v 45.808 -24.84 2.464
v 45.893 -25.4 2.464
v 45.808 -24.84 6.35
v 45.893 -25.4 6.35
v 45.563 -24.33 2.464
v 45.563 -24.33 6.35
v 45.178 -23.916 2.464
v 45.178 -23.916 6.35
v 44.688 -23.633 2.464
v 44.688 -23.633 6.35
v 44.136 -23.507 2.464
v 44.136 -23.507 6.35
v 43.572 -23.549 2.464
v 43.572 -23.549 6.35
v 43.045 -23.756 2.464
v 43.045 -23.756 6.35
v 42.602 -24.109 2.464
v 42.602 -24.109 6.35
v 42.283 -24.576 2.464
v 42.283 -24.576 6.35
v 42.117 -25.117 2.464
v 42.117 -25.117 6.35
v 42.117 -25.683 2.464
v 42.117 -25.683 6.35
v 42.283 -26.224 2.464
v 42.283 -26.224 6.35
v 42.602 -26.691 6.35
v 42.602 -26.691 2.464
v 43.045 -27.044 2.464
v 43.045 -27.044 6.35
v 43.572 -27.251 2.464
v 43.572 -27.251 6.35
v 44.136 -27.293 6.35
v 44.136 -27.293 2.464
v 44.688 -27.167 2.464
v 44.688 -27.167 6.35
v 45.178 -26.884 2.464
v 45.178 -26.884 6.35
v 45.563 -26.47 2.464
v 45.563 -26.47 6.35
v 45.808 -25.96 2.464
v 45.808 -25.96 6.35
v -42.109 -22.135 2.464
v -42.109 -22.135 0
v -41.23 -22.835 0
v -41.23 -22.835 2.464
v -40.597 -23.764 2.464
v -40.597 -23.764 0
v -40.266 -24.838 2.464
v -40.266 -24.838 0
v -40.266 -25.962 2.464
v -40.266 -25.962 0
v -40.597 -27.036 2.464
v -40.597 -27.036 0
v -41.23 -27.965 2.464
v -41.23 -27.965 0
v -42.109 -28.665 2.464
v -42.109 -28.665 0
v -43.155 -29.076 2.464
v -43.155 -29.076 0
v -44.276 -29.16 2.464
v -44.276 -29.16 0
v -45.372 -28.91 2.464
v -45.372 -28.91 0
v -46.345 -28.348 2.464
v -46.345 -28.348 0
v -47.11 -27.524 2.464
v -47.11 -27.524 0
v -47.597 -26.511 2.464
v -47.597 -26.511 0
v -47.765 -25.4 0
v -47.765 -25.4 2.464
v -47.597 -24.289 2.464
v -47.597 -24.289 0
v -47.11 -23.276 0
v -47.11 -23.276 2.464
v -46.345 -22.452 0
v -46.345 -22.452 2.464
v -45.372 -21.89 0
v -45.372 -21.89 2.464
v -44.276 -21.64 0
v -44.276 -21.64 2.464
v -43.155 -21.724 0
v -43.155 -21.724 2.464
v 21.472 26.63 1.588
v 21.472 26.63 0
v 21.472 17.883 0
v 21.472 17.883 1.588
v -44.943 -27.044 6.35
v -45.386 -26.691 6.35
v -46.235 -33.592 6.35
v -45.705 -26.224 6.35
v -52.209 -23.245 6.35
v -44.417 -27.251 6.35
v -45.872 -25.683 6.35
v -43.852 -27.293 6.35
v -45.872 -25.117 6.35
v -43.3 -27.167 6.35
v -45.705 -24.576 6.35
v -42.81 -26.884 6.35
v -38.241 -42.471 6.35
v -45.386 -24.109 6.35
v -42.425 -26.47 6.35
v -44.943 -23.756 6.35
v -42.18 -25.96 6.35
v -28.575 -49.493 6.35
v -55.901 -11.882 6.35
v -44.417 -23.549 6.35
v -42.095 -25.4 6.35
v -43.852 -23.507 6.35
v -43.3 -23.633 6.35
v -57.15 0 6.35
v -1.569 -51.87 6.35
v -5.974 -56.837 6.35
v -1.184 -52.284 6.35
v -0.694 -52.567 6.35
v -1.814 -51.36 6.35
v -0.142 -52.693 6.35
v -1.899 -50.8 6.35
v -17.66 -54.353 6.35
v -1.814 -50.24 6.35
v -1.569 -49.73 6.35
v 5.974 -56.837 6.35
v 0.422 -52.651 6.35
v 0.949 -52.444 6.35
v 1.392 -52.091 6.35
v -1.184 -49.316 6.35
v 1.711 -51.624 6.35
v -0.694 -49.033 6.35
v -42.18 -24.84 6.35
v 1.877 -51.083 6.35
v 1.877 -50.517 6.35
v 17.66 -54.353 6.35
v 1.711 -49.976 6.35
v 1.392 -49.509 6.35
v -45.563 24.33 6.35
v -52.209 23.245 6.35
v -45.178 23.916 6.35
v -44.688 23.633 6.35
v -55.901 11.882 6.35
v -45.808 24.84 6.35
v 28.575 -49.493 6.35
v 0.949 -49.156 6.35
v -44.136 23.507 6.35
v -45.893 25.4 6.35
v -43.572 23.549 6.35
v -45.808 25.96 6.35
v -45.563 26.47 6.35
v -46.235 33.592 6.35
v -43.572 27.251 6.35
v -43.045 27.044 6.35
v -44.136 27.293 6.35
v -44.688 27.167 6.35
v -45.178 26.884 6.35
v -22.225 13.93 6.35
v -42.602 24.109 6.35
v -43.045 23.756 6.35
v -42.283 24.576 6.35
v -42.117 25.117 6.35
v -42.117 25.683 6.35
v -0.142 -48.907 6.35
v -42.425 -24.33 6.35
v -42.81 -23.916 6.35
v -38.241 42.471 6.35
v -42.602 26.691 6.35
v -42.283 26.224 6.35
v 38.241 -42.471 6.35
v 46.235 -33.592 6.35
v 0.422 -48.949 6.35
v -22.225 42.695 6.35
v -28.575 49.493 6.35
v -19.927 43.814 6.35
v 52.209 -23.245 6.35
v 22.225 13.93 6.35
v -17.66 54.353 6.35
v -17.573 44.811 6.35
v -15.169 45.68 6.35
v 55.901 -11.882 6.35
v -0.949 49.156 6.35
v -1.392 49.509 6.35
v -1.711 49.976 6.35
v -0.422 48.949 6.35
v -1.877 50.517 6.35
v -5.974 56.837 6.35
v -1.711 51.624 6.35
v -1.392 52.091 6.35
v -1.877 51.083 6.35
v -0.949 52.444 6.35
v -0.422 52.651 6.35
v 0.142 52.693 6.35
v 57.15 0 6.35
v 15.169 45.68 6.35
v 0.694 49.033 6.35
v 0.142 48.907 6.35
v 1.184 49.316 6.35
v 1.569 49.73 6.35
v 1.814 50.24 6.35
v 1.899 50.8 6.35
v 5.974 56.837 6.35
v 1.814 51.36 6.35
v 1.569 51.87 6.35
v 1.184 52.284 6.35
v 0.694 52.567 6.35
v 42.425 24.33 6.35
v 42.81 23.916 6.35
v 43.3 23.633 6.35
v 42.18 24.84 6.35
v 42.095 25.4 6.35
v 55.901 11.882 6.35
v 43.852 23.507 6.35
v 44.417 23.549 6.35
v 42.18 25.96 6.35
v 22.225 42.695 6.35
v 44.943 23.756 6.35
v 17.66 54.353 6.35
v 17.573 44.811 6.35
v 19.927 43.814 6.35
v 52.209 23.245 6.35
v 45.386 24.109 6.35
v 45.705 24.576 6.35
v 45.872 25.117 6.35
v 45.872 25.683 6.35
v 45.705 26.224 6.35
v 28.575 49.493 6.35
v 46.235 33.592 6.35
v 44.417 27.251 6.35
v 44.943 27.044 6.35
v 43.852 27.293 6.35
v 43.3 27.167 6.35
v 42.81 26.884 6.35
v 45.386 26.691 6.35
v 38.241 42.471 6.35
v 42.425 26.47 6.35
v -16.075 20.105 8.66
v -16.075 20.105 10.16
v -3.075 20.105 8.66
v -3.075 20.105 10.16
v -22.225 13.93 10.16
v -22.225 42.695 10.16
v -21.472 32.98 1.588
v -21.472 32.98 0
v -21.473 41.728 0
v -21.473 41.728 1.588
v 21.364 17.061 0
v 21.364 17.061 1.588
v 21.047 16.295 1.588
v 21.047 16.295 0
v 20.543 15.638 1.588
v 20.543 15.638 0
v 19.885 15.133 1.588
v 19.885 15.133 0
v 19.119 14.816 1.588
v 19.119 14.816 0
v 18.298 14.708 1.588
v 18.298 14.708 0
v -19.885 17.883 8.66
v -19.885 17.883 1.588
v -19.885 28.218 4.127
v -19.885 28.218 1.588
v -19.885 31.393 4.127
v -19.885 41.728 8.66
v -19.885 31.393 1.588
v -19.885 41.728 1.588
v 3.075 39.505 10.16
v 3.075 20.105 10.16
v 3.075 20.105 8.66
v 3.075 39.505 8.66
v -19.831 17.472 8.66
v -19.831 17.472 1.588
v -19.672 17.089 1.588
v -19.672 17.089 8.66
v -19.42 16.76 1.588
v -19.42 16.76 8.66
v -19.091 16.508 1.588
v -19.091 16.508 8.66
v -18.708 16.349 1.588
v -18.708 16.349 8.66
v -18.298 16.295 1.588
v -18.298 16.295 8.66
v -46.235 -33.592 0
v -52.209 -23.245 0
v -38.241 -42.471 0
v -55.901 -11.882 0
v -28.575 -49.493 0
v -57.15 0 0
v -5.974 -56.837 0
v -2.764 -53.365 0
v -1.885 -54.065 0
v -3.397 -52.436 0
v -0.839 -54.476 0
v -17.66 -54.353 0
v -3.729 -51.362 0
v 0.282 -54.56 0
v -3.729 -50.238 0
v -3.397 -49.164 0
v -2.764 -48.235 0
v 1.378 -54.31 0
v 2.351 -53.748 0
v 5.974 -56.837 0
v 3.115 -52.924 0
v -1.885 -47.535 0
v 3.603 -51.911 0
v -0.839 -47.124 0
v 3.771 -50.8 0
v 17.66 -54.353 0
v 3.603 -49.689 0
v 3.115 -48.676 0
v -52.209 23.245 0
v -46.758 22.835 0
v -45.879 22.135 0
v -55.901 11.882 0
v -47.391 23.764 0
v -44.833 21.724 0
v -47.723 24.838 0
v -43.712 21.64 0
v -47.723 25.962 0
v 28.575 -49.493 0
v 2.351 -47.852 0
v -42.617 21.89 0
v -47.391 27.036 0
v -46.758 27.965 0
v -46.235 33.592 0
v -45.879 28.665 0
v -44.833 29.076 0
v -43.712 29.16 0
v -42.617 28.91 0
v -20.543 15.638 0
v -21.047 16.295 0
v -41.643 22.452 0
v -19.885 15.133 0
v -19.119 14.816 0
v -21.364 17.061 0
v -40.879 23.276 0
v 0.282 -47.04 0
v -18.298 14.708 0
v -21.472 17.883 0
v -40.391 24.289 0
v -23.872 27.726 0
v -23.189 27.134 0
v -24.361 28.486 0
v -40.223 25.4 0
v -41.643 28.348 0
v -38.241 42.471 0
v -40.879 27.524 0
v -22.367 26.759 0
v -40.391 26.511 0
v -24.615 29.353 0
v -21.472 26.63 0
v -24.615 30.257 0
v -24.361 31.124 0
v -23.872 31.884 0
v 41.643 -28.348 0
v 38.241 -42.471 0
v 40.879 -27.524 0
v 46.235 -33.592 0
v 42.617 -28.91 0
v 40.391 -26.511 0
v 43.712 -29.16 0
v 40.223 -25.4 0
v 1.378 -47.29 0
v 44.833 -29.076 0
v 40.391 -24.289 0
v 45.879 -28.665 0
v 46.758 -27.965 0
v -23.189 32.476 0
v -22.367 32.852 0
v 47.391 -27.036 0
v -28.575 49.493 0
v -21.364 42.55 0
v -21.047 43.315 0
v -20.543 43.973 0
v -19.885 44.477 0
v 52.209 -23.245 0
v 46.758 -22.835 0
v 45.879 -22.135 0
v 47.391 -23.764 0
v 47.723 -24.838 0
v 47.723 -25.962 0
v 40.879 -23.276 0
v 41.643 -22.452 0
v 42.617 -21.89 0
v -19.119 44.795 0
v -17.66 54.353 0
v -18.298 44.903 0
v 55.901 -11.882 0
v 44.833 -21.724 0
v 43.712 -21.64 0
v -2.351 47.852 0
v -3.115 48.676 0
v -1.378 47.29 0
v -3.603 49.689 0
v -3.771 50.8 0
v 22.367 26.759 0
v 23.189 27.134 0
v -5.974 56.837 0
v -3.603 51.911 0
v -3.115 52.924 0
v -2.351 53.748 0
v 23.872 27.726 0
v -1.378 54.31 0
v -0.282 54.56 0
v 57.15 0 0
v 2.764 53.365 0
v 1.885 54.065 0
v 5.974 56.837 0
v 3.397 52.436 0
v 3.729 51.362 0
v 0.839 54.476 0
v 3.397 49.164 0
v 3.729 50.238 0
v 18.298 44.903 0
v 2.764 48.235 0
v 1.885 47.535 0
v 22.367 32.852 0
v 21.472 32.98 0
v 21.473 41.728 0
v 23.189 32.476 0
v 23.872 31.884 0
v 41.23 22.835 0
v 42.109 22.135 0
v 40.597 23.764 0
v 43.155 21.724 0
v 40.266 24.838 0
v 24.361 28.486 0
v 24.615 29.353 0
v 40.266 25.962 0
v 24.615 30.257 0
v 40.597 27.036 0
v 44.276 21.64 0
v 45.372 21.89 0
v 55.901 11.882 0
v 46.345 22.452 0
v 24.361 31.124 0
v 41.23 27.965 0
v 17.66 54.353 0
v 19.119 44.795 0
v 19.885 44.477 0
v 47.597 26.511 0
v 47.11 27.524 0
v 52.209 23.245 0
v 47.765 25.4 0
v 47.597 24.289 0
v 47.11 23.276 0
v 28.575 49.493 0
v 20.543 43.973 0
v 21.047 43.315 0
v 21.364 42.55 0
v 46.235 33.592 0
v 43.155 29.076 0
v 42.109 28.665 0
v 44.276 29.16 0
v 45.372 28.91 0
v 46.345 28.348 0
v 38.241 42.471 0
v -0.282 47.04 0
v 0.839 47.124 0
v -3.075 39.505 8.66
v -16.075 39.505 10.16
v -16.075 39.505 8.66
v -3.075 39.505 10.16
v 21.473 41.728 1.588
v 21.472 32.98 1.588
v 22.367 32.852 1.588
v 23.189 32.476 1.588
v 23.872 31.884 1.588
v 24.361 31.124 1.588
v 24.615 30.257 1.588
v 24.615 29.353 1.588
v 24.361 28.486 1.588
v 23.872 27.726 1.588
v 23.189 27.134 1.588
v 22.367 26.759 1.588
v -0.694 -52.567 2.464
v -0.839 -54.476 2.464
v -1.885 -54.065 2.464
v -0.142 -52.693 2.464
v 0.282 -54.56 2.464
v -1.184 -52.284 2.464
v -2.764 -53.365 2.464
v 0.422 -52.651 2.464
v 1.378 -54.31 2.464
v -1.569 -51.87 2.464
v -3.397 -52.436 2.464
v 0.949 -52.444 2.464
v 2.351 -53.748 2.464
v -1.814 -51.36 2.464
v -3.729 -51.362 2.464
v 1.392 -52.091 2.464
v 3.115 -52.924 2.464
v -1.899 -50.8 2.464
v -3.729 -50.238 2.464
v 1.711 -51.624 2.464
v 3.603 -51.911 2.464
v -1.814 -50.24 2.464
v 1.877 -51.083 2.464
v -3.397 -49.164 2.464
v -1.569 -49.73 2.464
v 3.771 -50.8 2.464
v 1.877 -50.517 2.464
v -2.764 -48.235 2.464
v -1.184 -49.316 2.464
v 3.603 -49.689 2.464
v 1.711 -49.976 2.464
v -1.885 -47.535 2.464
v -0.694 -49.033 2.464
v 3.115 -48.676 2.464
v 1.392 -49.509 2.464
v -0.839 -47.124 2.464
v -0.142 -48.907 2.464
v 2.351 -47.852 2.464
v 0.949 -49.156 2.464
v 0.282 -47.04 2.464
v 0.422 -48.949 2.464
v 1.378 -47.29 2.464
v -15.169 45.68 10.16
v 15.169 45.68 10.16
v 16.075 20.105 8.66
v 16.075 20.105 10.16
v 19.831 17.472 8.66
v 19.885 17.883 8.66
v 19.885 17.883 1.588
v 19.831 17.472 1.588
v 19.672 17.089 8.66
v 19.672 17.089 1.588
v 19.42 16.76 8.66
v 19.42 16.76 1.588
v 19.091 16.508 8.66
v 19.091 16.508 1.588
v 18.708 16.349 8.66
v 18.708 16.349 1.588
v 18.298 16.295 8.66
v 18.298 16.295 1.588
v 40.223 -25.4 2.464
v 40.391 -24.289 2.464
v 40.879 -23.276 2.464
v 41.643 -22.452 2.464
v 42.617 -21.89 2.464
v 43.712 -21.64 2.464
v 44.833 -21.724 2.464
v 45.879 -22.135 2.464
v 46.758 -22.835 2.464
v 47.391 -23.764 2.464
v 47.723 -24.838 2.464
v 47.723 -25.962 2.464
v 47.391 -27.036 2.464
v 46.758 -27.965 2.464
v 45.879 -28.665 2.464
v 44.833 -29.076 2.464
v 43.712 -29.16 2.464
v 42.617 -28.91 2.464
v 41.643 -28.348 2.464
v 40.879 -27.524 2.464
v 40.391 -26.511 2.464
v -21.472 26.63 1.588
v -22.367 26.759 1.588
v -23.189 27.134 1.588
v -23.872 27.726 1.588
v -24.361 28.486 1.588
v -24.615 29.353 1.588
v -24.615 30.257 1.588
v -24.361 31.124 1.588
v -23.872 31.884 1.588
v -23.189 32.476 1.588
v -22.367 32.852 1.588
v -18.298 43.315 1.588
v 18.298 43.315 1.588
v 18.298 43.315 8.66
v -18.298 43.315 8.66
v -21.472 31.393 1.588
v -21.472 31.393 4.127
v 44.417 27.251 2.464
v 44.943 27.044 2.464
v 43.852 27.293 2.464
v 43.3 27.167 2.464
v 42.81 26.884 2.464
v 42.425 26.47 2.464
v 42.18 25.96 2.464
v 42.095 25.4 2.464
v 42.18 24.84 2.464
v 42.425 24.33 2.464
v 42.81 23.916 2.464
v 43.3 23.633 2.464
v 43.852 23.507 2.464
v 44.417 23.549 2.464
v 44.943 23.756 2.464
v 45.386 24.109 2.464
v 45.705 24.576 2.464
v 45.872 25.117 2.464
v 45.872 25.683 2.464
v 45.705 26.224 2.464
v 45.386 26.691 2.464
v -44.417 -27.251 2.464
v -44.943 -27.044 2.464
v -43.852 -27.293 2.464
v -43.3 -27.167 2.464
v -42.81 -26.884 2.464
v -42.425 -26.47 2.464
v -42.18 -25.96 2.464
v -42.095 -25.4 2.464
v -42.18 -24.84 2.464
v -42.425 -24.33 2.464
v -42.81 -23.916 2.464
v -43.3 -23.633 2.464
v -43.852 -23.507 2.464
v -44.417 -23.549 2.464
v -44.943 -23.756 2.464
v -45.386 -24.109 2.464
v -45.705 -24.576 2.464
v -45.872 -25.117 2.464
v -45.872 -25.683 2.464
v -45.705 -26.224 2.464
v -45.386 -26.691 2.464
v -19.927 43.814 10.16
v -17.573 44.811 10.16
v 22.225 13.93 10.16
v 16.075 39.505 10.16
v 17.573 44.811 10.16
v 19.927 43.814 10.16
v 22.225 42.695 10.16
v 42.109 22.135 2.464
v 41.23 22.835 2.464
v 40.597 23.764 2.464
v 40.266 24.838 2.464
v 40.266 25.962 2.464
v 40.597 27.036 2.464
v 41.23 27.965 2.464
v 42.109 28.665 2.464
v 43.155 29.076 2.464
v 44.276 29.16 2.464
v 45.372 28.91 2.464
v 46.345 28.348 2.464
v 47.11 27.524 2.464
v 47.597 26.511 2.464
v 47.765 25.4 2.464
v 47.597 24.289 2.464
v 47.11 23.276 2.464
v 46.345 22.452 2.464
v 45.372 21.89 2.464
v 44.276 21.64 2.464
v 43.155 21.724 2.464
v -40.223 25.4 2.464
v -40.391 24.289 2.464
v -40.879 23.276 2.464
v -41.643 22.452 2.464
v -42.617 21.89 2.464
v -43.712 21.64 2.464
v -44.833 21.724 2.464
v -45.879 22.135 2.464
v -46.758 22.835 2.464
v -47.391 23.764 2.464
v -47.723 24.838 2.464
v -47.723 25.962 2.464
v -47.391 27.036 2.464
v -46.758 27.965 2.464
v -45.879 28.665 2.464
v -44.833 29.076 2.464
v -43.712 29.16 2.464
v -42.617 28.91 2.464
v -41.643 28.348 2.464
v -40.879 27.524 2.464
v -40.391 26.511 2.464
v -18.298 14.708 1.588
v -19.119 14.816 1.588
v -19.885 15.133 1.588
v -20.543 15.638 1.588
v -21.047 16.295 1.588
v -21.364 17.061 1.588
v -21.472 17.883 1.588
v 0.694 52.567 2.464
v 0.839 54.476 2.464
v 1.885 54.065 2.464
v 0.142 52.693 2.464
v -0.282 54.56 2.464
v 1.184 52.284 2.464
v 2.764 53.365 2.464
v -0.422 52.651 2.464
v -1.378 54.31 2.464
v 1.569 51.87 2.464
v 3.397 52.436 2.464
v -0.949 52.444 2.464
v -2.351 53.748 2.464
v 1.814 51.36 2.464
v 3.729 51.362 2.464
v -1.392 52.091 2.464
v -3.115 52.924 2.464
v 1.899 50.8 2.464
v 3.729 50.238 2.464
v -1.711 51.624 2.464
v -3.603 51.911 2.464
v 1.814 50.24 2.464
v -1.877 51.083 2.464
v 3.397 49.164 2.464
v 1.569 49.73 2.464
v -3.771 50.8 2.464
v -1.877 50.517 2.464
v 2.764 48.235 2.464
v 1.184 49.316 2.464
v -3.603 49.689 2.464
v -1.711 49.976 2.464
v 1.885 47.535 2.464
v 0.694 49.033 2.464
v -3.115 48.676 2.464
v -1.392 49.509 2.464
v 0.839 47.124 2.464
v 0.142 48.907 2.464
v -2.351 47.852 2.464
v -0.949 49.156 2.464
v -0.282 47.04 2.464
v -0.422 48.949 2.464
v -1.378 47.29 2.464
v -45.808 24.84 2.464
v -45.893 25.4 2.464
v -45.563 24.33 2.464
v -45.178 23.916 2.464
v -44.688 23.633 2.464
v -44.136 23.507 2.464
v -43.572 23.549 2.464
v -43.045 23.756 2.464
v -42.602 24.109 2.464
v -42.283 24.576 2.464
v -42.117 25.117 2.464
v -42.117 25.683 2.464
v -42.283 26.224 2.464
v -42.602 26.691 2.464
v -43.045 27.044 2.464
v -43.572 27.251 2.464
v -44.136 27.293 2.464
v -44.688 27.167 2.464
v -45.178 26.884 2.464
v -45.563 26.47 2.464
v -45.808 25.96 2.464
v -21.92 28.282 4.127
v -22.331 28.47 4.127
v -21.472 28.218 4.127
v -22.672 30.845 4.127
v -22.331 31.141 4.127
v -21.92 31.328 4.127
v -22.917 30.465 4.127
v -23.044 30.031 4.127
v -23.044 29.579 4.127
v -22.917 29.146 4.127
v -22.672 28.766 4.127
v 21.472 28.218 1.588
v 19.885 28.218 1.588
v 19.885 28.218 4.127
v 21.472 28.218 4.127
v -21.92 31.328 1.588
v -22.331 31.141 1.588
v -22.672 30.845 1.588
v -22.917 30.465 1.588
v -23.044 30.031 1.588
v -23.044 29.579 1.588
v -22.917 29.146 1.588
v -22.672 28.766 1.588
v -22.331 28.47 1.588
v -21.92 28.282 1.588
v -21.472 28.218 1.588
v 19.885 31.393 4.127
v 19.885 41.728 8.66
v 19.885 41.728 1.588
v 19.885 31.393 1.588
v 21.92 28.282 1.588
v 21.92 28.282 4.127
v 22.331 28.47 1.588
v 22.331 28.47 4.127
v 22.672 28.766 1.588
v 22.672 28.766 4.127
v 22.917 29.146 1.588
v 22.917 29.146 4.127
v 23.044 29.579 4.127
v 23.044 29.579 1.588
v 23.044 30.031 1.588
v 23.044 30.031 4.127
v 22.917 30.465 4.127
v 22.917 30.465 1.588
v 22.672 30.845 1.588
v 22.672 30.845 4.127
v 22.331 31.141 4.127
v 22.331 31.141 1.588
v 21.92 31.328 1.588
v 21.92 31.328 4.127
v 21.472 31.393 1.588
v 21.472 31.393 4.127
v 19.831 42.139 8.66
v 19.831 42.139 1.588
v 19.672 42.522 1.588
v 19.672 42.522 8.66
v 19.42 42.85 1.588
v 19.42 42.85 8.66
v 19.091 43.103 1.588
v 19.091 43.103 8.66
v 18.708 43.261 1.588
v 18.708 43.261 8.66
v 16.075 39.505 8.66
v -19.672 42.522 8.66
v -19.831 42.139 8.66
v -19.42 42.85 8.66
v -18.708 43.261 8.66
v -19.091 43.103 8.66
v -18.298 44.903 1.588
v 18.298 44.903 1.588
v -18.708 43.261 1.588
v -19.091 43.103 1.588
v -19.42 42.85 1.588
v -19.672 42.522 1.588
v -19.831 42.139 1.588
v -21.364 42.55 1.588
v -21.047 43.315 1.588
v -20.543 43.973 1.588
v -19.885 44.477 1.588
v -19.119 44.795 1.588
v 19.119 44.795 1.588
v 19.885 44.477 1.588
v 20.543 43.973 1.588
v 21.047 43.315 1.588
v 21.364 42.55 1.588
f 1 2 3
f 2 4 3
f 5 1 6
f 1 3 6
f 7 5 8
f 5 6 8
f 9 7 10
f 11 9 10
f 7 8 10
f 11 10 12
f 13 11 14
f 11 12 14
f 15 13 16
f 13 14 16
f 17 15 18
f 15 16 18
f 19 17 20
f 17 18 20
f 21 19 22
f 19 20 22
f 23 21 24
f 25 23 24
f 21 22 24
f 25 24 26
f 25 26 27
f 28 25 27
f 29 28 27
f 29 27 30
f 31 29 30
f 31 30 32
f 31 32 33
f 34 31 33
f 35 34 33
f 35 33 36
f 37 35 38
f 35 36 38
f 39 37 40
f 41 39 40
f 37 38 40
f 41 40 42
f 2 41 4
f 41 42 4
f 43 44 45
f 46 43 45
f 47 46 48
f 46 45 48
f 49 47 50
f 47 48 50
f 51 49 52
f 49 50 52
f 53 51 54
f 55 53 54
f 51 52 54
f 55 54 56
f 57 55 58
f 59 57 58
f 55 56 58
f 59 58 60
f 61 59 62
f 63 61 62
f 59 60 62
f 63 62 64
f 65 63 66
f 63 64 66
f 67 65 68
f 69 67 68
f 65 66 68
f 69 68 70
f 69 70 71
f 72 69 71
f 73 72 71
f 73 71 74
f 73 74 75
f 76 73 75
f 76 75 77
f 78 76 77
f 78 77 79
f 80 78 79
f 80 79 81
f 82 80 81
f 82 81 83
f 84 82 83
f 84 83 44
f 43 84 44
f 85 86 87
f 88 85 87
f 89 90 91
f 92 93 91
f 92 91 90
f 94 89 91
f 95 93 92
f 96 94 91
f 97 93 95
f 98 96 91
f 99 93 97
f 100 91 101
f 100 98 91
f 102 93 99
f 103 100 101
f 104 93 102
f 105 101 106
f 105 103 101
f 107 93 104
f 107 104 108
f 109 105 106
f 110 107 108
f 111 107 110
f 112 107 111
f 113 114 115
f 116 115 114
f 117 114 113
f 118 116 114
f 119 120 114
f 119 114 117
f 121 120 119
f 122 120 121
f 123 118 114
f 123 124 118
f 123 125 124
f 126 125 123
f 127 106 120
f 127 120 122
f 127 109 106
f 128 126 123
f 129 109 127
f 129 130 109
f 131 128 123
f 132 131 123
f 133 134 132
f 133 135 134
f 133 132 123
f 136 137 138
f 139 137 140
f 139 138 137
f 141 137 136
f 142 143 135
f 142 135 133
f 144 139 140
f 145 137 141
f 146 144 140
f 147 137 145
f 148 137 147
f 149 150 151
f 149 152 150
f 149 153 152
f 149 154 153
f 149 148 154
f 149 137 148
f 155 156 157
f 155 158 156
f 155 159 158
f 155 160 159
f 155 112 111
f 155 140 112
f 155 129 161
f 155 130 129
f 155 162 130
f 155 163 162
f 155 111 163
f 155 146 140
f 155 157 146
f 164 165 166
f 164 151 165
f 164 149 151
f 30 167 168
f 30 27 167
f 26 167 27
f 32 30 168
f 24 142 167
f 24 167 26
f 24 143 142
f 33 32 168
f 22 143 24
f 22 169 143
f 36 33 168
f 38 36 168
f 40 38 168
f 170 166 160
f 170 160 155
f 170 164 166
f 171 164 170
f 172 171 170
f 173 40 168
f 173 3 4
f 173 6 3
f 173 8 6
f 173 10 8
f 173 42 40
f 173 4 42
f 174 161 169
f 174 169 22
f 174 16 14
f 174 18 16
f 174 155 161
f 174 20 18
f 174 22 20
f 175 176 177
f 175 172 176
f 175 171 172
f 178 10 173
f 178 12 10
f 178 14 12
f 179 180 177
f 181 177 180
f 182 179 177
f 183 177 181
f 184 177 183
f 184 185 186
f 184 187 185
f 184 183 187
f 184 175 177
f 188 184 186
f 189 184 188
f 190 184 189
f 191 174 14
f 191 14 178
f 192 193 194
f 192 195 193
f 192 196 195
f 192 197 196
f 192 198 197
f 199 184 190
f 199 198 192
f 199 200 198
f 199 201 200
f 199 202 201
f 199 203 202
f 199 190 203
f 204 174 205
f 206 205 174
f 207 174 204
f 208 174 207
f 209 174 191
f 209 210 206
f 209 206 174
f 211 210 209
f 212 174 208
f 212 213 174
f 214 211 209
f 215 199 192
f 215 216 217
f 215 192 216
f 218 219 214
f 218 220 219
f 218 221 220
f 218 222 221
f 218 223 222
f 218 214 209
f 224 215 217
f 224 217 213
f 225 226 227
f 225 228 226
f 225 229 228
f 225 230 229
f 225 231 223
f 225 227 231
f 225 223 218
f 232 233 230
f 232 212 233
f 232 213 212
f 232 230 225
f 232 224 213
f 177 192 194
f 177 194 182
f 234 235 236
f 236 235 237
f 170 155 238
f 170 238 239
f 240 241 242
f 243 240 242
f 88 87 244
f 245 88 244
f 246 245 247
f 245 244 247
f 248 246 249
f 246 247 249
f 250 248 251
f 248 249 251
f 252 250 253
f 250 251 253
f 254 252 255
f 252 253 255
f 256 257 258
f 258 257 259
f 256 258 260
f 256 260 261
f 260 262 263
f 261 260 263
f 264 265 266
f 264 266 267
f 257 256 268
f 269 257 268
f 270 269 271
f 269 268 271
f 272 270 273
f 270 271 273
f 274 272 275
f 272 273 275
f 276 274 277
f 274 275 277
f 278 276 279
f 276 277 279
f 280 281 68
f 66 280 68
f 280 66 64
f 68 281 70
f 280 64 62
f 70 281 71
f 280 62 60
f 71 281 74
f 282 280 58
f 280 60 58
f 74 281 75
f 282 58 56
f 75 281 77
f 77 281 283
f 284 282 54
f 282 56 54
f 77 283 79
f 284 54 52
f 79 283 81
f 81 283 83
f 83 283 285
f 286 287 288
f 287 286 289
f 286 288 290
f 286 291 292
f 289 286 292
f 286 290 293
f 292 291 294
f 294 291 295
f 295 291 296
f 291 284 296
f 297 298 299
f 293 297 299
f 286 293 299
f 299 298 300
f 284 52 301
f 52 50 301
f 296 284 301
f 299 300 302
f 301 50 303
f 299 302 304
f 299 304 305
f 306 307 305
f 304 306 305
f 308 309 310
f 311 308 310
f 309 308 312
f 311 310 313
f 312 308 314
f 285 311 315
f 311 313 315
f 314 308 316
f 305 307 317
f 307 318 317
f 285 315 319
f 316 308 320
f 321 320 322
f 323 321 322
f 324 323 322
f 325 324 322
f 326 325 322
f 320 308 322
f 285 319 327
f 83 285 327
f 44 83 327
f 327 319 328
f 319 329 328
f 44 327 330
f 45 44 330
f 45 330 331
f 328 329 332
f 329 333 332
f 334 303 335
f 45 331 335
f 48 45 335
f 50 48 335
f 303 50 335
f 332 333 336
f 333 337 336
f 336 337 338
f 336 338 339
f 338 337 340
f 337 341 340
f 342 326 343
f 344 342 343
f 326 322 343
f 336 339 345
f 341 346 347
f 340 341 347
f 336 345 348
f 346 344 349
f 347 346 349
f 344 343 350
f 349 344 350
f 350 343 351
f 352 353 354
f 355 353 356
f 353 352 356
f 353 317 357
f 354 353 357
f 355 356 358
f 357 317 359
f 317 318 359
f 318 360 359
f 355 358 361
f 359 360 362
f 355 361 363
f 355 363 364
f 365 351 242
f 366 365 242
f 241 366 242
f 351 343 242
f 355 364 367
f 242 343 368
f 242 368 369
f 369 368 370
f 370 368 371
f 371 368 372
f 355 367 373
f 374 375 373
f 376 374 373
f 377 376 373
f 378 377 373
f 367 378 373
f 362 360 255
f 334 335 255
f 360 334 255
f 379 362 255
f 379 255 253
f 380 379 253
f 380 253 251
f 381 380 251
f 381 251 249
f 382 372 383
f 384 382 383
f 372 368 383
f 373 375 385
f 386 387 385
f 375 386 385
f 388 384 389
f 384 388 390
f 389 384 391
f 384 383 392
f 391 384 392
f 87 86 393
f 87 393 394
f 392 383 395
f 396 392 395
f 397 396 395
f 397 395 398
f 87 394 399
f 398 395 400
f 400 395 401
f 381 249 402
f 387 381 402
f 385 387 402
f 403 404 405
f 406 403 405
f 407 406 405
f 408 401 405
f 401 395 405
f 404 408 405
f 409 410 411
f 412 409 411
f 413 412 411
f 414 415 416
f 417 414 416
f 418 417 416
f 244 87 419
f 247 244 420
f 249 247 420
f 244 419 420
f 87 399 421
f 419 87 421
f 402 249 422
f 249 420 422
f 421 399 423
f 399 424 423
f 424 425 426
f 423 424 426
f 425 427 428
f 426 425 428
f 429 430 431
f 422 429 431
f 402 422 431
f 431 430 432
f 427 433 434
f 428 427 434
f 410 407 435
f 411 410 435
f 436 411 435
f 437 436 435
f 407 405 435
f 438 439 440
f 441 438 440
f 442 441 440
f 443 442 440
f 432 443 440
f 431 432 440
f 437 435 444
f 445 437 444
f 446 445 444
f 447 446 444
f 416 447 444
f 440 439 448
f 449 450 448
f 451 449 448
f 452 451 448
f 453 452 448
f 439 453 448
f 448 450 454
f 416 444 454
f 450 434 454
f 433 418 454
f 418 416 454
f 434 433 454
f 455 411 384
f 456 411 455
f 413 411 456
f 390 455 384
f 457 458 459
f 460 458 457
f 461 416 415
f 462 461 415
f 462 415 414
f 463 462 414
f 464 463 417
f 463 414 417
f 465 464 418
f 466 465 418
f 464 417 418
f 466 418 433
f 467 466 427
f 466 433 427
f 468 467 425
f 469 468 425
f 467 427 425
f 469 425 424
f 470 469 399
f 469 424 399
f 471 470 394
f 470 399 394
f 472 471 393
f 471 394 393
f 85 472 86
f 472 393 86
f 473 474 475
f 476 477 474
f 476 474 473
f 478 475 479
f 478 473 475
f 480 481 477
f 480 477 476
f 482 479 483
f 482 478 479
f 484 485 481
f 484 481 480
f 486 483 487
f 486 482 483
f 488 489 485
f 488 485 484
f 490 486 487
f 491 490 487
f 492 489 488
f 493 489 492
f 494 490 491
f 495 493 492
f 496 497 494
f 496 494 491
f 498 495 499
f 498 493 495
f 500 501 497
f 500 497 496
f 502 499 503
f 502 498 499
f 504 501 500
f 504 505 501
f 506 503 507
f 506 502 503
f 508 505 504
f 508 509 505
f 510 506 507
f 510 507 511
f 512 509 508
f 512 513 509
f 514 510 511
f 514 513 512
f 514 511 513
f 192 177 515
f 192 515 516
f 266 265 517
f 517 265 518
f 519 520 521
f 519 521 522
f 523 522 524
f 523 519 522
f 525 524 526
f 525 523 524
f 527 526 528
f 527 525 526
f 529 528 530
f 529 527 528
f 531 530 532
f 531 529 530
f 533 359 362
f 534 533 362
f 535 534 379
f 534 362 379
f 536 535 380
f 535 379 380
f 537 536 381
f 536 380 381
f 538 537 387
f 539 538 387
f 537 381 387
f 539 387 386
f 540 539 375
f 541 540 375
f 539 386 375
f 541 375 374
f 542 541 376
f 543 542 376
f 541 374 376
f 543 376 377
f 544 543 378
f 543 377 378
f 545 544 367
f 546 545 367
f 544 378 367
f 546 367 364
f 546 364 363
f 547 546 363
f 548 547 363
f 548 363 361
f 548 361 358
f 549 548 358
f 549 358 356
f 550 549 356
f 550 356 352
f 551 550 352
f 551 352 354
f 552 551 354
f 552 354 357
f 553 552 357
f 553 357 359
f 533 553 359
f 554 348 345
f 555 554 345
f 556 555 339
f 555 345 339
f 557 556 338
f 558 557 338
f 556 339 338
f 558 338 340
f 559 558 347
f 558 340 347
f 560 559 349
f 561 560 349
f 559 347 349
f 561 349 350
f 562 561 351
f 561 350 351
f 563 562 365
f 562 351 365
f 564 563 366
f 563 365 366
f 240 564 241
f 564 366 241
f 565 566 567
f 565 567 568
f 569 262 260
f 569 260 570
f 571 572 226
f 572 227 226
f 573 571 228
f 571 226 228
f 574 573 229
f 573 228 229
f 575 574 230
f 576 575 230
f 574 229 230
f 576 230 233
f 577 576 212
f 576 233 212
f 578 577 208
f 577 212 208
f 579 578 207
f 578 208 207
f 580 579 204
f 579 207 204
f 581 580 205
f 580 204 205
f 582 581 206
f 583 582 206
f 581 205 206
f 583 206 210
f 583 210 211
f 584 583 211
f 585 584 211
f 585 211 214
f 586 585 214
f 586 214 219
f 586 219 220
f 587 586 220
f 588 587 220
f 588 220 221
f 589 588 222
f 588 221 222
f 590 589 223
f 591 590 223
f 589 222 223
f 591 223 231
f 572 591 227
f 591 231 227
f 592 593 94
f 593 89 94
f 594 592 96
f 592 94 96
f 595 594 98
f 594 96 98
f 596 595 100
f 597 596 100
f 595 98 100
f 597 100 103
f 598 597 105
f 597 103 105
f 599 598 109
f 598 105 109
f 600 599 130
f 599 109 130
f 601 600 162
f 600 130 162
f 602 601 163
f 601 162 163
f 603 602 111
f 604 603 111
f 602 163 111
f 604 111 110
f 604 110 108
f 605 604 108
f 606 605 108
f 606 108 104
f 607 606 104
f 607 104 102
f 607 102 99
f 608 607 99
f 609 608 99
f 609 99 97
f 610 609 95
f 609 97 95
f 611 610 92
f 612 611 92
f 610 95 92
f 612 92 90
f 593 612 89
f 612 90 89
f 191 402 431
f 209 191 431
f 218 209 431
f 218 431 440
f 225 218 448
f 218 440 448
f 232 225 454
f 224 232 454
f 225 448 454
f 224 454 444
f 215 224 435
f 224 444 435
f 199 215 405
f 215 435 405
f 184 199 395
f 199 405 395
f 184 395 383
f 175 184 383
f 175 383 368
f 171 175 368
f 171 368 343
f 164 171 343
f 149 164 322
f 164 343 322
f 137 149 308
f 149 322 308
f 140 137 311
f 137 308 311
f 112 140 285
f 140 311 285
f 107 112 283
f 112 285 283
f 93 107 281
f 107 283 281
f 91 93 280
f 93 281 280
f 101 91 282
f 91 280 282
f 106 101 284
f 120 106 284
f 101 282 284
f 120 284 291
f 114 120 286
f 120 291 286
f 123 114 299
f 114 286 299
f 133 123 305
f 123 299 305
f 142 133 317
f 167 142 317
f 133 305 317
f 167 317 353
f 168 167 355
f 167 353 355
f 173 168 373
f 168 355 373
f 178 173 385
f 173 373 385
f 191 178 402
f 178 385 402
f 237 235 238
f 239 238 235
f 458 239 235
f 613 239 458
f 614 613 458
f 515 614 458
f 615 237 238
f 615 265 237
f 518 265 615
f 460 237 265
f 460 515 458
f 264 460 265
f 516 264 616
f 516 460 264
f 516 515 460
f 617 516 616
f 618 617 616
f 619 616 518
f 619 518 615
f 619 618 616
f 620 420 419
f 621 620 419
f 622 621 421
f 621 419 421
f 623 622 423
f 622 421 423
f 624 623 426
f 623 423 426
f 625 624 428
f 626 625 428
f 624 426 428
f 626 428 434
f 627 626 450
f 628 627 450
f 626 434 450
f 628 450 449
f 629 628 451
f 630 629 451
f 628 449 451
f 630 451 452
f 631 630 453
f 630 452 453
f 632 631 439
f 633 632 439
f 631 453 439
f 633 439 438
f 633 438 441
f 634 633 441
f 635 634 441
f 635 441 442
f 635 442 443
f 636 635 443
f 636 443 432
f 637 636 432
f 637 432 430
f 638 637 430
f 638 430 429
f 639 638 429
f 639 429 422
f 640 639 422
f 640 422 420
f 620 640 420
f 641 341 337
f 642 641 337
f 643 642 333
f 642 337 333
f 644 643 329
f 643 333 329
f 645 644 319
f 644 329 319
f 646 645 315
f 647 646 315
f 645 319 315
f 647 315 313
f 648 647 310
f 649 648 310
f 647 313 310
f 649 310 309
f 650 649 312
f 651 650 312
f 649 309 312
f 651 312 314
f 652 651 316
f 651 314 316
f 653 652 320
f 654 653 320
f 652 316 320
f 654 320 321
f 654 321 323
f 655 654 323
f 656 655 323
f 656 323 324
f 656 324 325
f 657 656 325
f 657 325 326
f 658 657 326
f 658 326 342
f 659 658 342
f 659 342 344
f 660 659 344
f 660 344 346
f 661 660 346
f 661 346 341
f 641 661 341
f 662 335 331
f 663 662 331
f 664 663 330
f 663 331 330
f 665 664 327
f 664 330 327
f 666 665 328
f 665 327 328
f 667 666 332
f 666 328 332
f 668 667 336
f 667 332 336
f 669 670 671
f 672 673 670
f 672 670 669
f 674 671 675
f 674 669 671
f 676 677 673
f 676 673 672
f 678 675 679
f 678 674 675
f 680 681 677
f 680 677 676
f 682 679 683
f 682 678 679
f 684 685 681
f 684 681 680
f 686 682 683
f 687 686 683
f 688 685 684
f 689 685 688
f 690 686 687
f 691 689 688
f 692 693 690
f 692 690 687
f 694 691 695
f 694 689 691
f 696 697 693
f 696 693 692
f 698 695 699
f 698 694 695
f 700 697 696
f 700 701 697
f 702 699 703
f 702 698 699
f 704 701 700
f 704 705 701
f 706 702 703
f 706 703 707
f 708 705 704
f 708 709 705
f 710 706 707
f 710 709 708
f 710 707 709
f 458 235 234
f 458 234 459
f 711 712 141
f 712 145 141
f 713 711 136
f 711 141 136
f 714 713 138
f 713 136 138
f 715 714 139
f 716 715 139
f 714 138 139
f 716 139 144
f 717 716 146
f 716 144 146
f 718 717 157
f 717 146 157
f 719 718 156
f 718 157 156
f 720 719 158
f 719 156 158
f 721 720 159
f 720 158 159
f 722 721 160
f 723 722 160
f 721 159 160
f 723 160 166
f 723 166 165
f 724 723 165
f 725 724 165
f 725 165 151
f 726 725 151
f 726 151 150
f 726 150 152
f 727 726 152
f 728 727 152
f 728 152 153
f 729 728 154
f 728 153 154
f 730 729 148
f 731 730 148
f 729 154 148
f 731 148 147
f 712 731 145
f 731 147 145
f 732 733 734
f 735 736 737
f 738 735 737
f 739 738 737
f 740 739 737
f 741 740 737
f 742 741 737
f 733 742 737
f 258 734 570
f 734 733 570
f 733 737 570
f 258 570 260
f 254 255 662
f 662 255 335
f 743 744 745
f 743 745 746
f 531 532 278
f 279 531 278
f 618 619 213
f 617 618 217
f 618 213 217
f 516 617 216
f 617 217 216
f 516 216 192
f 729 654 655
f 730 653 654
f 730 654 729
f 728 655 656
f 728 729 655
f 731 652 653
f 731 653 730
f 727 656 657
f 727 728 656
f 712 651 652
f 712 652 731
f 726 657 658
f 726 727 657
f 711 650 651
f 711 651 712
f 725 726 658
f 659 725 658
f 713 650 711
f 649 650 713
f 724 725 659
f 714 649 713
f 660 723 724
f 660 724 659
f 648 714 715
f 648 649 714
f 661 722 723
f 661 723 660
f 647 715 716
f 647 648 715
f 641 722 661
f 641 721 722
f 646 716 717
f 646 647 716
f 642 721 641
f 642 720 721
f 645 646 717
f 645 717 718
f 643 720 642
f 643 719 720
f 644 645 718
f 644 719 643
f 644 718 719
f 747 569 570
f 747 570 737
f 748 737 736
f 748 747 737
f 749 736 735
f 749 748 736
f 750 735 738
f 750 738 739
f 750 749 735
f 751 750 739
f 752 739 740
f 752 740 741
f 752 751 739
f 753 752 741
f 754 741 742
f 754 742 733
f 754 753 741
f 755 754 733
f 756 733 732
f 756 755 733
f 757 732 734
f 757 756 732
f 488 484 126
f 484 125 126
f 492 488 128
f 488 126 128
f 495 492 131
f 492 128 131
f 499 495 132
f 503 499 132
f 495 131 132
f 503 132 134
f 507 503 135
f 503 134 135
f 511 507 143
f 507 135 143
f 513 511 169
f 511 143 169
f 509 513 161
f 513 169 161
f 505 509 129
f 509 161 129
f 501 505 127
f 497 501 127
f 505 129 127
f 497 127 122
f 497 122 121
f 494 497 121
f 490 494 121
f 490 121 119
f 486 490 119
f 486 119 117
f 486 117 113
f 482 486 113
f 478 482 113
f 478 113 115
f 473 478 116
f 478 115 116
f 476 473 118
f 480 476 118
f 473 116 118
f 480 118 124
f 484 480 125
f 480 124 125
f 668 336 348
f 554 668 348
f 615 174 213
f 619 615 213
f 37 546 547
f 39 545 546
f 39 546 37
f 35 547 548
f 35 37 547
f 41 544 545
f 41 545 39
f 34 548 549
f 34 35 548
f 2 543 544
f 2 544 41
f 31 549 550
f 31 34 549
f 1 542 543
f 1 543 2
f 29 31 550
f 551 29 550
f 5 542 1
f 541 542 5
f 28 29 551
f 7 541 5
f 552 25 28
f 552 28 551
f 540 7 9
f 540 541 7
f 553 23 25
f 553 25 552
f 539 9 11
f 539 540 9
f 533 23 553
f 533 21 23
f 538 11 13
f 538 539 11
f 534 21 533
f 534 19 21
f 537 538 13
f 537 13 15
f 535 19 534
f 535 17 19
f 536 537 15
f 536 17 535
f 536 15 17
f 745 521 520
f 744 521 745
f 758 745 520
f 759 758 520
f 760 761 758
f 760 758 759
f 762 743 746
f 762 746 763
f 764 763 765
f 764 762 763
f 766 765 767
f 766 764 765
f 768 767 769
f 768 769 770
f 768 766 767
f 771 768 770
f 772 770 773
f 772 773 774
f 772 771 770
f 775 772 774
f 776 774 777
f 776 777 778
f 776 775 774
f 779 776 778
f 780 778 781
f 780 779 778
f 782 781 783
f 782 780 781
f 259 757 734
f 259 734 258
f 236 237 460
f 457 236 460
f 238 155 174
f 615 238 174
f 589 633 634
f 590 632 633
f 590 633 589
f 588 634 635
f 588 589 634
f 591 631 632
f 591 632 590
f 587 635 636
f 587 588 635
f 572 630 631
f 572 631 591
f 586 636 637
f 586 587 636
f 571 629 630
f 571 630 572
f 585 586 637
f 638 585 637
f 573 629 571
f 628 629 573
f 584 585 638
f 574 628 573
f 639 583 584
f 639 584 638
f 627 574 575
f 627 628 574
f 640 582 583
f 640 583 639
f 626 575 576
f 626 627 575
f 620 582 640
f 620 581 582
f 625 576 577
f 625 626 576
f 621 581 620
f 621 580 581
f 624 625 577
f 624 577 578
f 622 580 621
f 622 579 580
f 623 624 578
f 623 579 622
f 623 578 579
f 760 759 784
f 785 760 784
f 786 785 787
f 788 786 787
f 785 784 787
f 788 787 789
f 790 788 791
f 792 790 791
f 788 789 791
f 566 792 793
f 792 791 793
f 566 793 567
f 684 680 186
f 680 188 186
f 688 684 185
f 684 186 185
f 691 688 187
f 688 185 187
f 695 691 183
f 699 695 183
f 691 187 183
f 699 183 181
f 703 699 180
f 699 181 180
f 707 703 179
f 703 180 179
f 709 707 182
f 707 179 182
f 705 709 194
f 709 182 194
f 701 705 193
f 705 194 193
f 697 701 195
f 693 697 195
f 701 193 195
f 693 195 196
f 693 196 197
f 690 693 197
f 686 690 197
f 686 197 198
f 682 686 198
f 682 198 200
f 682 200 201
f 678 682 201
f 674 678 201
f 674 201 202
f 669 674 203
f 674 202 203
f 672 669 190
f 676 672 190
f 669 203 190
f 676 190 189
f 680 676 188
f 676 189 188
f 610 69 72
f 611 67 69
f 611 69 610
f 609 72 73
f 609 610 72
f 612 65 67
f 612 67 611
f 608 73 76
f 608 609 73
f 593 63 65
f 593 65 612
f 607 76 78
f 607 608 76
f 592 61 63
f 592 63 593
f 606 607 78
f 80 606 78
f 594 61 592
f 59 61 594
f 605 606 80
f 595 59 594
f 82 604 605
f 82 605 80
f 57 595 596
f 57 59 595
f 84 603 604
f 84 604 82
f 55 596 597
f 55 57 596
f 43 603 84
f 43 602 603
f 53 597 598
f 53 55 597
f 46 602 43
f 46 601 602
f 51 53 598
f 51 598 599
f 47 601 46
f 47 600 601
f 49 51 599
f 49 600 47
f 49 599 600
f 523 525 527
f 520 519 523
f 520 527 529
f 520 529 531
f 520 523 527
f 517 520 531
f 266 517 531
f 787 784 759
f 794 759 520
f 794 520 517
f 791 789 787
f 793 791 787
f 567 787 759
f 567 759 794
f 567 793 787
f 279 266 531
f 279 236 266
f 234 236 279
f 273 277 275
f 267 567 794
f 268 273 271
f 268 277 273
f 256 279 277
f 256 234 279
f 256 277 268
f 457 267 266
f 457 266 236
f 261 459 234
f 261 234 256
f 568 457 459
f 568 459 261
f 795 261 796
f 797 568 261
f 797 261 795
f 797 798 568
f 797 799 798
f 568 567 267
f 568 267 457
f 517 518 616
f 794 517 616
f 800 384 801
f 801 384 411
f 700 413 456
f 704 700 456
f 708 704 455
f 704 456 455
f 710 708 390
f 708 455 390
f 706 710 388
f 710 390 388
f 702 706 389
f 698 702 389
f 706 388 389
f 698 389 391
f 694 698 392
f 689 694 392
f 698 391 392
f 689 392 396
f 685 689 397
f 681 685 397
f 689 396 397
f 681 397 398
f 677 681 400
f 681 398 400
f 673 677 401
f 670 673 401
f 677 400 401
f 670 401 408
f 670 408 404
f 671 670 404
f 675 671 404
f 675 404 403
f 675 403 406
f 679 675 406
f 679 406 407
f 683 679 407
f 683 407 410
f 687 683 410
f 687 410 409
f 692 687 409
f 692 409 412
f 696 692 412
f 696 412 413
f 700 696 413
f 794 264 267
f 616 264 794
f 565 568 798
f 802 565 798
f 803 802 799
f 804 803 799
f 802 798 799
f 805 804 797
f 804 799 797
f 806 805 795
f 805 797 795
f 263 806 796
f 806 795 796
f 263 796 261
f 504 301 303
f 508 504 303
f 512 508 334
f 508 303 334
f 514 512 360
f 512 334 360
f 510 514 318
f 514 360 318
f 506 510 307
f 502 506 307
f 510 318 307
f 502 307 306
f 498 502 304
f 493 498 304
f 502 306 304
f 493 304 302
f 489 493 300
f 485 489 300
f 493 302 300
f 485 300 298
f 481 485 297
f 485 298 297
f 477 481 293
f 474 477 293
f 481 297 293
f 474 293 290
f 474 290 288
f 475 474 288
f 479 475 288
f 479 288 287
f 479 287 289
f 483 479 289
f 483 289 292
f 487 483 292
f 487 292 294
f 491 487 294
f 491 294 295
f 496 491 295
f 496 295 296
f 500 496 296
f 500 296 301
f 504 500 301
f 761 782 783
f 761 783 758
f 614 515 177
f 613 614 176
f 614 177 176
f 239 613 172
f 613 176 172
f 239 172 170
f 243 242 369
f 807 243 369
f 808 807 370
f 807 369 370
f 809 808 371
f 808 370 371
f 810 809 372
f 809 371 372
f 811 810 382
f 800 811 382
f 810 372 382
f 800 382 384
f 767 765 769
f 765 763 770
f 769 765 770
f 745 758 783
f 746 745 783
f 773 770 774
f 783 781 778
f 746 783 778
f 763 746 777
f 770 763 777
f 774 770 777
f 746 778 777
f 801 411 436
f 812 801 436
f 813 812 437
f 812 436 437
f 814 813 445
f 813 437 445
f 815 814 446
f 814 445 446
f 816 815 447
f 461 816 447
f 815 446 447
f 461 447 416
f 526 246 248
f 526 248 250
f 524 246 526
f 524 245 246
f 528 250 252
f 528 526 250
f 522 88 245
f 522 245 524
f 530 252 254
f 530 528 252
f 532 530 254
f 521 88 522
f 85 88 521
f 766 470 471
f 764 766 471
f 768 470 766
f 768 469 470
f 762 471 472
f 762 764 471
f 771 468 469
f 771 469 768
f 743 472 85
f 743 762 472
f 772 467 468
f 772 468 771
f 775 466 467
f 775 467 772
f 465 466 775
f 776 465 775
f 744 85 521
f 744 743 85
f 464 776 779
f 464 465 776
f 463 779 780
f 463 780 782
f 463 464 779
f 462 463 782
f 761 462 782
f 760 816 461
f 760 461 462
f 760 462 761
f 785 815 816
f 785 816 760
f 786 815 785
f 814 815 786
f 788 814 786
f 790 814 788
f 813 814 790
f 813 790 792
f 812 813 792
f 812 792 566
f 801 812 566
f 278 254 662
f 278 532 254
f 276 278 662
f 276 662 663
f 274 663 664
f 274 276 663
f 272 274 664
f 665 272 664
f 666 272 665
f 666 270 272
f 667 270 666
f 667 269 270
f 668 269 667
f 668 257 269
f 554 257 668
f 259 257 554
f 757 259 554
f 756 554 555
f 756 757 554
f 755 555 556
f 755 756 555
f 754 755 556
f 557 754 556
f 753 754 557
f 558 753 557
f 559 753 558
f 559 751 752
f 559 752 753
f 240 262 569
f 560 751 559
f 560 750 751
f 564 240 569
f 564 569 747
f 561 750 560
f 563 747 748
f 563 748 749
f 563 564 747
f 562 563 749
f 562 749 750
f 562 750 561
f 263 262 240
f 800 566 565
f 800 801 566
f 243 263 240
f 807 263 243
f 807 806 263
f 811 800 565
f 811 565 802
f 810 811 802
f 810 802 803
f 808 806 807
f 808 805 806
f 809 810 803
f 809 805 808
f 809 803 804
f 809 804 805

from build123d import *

# Parameters (mm, degrees)
SKETCH1_R                                       = 57.15
BOSS_EXTRUDE1_DEPTH                             = 6.35
SKETCH2_W                                       = 44.45
SKETCH2_H                                       = 31.75
BOSS_EXTRUDE2_DEPTH                             = 3.81
SKETCH3_W                                       = 13
SKETCH3_H                                       = 19.4
CUT_EXTRUDE1_DEPTH                              = 82.458397971
SKETCH4_W                                       = 39.77
SKETCH4_H                                       = 27.02
CUT_EXTRUDE2_DEPTH                              = 8.66
FILLET1_R                                       = 1.5875
CUT_EXTRUDE3_DEPTH                              = 1.5875
CBORE_FOR_6_PAN_HEAD_MACHINE_SCREW1_D           = 3.7973
CBORE_FOR_6_PAN_HEAD_MACHINE_SCREW1_CBORE_D     = 7.54126
CBORE_FOR_6_PAN_HEAD_MACHINE_SCREW1_CBORE_DEPTH = 2.4638
CIRPATTERN1_COUNT                               = 6
SKETCH27_R                                      = 63.5
SKETCH27_R_2                                    = 48.133
CUT_EXTRUDE14_DEPTH                             = 82.071372876
CUT_EXTRUDE15_DEPTH                             = 2.54


with BuildPart() as part:
    # Sketch1 → Boss-Extrude1 (new body)
    with BuildSketch(Plane.XY):
        Circle(SKETCH1_R)
    extrude(amount=BOSS_EXTRUDE1_DEPTH)

    # Sketch2 → Boss-Extrude2 (add)
    with BuildSketch(Plane.XY.offset(6.35)):
        with Locations((0, 29.80529526)):
            Rectangle(SKETCH2_W, SKETCH2_H)
    extrude(amount=BOSS_EXTRUDE2_DEPTH)

    # Sketch3 → Cut-Extrude1 (cut, through all)
    with BuildSketch(Plane.XY.offset(10.16)):
        with Locations((-9.575, 29.80529526)):
            Rectangle(SKETCH3_W, SKETCH3_H)
        with Locations((9.575, 29.80529526)):
            Rectangle(SKETCH3_W, SKETCH3_H)
    extrude(amount=-CUT_EXTRUDE1_DEPTH, mode=Mode.SUBTRACT)

    # Sketch4 → Cut-Extrude2 (cut)
    with BuildSketch(Plane(origin=(0, 0, 0), x_dir=(-1, 0, 0), z_dir=(0, 0, -1))):
        with Locations((0, 29.80529526)):
            Rectangle(SKETCH4_W, SKETCH4_H)
    extrude(amount=-CUT_EXTRUDE2_DEPTH, mode=Mode.SUBTRACT)

    # Fillet1
    fillet1_edges = [part.edges().sort_by_distance(p)[0] for p in [
        (-19.885, 16.29529526, 4.33),
        (-19.885, 43.31529526, 4.33),
        (19.885, 43.31529526, 4.33),
        (19.885, 16.29529526, 4.33),
    ]]
    fillet(fillet1_edges, radius=FILLET1_R)

    # Sketch8 → Cut-Extrude3 (cut)
    with BuildSketch(Plane(origin=(0, 0, 0), x_dir=(-1, 0, 0), z_dir=(0, 0, -1))):
        with BuildLine():
            Line((18.2975, 44.90279526), (-18.2975, 44.90279526))
            ThreePointArc((-18.2975, 44.90279526), (-20.54256403, 43.97285929), (-21.4725, 41.72779526))
            Line((-21.4725, 41.72779526), (-21.4725, 32.98029526))
            ThreePointArc((-21.4725, 32.98029526), (-24.6475, 29.80529526), (-21.4725, 26.63029526))
            Line((-21.4725, 26.63029526), (-21.4725, 17.88279526))
            ThreePointArc((-21.4725, 17.88279526), (-20.54256403, 15.637731229), (-18.2975, 14.70779526))
            Line((-18.2975, 14.70779526), (18.2975, 14.70779526))
            ThreePointArc((18.2975, 14.70779526), (20.54256403, 15.637731229), (21.4725, 17.88279526))
            Line((21.4725, 17.88279526), (21.4725, 26.63029526))
            ThreePointArc((21.4725, 26.63029526), (24.6475, 29.80529526), (21.4725, 32.98029526))
            Line((21.4725, 32.98029526), (21.4725, 41.72779526))
            ThreePointArc((21.4725, 41.72779526), (20.54256403, 43.97285929), (18.2975, 44.90279526))
        make_face()
    extrude(amount=-CUT_EXTRUDE3_DEPTH, mode=Mode.SUBTRACT)

    # CBORE for #6 Pan Head Machine Screw1 (through all)
    with Locations(Plane(origin=(0, 0, 0), x_dir=(-1, 0, 0), z_dir=(0, 0, -1))):
        with Locations((-43.994090512, -25.4)):
            cbore_for_6_pan_head_machine_screw1 = CounterBoreHole(CBORE_FOR_6_PAN_HEAD_MACHINE_SCREW1_D / 2, CBORE_FOR_6_PAN_HEAD_MACHINE_SCREW1_CBORE_D / 2, CBORE_FOR_6_PAN_HEAD_MACHINE_SCREW1_CBORE_DEPTH)

    # CirPattern1: CBORE for #6 Pan Head Machine Screw1 ×6 about axis
    cirpattern1_axis = Axis((0, 0, 0), (0, 0, 1))
    for i in range(1, CIRPATTERN1_COUNT):
        add(cbore_for_6_pan_head_machine_screw1.rotate(cirpattern1_axis, i * 360 / CIRPATTERN1_COUNT), mode=Mode.SUBTRACT)

    # Sketch27 → Cut-Extrude14 (cut, through all)
    with BuildSketch(Plane.XY.offset(6.35)):
        Circle(SKETCH27_R)
        Circle(SKETCH27_R_2, mode=Mode.SUBTRACT)
    extrude(amount=CUT_EXTRUDE14_DEPTH, mode=Mode.SUBTRACT)

    # Sketch28 → Cut-Extrude15 (cut)
    with BuildSketch(Plane(origin=(0, 0, 1.5875), x_dir=(-1, 0, 0), z_dir=(0, 0, -1))):
        with BuildLine():
            Line((-21.4725, 31.39279526), (-19.885, 31.39279526))
            Line((-19.885, 31.39279526), (-19.885, 28.21779526))
            Line((-19.885, 28.21779526), (-21.4725, 28.21779526))
            ThreePointArc((-21.4725, 28.21779526), (-23.06, 29.80529526), (-21.4725, 31.39279526))
        make_face()
        with BuildLine():
            Line((21.4725, 28.21779526), (19.885, 28.21779526))
            Line((19.885, 28.21779526), (19.885, 31.39279526))
            Line((19.885, 31.39279526), (21.4725, 31.39279526))
            ThreePointArc((21.4725, 31.39279526), (23.06, 29.80529526), (21.4725, 28.21779526))
        make_face()
    extrude(amount=-CUT_EXTRUDE15_DEPTH, mode=Mode.SUBTRACT)


solid = part.part
